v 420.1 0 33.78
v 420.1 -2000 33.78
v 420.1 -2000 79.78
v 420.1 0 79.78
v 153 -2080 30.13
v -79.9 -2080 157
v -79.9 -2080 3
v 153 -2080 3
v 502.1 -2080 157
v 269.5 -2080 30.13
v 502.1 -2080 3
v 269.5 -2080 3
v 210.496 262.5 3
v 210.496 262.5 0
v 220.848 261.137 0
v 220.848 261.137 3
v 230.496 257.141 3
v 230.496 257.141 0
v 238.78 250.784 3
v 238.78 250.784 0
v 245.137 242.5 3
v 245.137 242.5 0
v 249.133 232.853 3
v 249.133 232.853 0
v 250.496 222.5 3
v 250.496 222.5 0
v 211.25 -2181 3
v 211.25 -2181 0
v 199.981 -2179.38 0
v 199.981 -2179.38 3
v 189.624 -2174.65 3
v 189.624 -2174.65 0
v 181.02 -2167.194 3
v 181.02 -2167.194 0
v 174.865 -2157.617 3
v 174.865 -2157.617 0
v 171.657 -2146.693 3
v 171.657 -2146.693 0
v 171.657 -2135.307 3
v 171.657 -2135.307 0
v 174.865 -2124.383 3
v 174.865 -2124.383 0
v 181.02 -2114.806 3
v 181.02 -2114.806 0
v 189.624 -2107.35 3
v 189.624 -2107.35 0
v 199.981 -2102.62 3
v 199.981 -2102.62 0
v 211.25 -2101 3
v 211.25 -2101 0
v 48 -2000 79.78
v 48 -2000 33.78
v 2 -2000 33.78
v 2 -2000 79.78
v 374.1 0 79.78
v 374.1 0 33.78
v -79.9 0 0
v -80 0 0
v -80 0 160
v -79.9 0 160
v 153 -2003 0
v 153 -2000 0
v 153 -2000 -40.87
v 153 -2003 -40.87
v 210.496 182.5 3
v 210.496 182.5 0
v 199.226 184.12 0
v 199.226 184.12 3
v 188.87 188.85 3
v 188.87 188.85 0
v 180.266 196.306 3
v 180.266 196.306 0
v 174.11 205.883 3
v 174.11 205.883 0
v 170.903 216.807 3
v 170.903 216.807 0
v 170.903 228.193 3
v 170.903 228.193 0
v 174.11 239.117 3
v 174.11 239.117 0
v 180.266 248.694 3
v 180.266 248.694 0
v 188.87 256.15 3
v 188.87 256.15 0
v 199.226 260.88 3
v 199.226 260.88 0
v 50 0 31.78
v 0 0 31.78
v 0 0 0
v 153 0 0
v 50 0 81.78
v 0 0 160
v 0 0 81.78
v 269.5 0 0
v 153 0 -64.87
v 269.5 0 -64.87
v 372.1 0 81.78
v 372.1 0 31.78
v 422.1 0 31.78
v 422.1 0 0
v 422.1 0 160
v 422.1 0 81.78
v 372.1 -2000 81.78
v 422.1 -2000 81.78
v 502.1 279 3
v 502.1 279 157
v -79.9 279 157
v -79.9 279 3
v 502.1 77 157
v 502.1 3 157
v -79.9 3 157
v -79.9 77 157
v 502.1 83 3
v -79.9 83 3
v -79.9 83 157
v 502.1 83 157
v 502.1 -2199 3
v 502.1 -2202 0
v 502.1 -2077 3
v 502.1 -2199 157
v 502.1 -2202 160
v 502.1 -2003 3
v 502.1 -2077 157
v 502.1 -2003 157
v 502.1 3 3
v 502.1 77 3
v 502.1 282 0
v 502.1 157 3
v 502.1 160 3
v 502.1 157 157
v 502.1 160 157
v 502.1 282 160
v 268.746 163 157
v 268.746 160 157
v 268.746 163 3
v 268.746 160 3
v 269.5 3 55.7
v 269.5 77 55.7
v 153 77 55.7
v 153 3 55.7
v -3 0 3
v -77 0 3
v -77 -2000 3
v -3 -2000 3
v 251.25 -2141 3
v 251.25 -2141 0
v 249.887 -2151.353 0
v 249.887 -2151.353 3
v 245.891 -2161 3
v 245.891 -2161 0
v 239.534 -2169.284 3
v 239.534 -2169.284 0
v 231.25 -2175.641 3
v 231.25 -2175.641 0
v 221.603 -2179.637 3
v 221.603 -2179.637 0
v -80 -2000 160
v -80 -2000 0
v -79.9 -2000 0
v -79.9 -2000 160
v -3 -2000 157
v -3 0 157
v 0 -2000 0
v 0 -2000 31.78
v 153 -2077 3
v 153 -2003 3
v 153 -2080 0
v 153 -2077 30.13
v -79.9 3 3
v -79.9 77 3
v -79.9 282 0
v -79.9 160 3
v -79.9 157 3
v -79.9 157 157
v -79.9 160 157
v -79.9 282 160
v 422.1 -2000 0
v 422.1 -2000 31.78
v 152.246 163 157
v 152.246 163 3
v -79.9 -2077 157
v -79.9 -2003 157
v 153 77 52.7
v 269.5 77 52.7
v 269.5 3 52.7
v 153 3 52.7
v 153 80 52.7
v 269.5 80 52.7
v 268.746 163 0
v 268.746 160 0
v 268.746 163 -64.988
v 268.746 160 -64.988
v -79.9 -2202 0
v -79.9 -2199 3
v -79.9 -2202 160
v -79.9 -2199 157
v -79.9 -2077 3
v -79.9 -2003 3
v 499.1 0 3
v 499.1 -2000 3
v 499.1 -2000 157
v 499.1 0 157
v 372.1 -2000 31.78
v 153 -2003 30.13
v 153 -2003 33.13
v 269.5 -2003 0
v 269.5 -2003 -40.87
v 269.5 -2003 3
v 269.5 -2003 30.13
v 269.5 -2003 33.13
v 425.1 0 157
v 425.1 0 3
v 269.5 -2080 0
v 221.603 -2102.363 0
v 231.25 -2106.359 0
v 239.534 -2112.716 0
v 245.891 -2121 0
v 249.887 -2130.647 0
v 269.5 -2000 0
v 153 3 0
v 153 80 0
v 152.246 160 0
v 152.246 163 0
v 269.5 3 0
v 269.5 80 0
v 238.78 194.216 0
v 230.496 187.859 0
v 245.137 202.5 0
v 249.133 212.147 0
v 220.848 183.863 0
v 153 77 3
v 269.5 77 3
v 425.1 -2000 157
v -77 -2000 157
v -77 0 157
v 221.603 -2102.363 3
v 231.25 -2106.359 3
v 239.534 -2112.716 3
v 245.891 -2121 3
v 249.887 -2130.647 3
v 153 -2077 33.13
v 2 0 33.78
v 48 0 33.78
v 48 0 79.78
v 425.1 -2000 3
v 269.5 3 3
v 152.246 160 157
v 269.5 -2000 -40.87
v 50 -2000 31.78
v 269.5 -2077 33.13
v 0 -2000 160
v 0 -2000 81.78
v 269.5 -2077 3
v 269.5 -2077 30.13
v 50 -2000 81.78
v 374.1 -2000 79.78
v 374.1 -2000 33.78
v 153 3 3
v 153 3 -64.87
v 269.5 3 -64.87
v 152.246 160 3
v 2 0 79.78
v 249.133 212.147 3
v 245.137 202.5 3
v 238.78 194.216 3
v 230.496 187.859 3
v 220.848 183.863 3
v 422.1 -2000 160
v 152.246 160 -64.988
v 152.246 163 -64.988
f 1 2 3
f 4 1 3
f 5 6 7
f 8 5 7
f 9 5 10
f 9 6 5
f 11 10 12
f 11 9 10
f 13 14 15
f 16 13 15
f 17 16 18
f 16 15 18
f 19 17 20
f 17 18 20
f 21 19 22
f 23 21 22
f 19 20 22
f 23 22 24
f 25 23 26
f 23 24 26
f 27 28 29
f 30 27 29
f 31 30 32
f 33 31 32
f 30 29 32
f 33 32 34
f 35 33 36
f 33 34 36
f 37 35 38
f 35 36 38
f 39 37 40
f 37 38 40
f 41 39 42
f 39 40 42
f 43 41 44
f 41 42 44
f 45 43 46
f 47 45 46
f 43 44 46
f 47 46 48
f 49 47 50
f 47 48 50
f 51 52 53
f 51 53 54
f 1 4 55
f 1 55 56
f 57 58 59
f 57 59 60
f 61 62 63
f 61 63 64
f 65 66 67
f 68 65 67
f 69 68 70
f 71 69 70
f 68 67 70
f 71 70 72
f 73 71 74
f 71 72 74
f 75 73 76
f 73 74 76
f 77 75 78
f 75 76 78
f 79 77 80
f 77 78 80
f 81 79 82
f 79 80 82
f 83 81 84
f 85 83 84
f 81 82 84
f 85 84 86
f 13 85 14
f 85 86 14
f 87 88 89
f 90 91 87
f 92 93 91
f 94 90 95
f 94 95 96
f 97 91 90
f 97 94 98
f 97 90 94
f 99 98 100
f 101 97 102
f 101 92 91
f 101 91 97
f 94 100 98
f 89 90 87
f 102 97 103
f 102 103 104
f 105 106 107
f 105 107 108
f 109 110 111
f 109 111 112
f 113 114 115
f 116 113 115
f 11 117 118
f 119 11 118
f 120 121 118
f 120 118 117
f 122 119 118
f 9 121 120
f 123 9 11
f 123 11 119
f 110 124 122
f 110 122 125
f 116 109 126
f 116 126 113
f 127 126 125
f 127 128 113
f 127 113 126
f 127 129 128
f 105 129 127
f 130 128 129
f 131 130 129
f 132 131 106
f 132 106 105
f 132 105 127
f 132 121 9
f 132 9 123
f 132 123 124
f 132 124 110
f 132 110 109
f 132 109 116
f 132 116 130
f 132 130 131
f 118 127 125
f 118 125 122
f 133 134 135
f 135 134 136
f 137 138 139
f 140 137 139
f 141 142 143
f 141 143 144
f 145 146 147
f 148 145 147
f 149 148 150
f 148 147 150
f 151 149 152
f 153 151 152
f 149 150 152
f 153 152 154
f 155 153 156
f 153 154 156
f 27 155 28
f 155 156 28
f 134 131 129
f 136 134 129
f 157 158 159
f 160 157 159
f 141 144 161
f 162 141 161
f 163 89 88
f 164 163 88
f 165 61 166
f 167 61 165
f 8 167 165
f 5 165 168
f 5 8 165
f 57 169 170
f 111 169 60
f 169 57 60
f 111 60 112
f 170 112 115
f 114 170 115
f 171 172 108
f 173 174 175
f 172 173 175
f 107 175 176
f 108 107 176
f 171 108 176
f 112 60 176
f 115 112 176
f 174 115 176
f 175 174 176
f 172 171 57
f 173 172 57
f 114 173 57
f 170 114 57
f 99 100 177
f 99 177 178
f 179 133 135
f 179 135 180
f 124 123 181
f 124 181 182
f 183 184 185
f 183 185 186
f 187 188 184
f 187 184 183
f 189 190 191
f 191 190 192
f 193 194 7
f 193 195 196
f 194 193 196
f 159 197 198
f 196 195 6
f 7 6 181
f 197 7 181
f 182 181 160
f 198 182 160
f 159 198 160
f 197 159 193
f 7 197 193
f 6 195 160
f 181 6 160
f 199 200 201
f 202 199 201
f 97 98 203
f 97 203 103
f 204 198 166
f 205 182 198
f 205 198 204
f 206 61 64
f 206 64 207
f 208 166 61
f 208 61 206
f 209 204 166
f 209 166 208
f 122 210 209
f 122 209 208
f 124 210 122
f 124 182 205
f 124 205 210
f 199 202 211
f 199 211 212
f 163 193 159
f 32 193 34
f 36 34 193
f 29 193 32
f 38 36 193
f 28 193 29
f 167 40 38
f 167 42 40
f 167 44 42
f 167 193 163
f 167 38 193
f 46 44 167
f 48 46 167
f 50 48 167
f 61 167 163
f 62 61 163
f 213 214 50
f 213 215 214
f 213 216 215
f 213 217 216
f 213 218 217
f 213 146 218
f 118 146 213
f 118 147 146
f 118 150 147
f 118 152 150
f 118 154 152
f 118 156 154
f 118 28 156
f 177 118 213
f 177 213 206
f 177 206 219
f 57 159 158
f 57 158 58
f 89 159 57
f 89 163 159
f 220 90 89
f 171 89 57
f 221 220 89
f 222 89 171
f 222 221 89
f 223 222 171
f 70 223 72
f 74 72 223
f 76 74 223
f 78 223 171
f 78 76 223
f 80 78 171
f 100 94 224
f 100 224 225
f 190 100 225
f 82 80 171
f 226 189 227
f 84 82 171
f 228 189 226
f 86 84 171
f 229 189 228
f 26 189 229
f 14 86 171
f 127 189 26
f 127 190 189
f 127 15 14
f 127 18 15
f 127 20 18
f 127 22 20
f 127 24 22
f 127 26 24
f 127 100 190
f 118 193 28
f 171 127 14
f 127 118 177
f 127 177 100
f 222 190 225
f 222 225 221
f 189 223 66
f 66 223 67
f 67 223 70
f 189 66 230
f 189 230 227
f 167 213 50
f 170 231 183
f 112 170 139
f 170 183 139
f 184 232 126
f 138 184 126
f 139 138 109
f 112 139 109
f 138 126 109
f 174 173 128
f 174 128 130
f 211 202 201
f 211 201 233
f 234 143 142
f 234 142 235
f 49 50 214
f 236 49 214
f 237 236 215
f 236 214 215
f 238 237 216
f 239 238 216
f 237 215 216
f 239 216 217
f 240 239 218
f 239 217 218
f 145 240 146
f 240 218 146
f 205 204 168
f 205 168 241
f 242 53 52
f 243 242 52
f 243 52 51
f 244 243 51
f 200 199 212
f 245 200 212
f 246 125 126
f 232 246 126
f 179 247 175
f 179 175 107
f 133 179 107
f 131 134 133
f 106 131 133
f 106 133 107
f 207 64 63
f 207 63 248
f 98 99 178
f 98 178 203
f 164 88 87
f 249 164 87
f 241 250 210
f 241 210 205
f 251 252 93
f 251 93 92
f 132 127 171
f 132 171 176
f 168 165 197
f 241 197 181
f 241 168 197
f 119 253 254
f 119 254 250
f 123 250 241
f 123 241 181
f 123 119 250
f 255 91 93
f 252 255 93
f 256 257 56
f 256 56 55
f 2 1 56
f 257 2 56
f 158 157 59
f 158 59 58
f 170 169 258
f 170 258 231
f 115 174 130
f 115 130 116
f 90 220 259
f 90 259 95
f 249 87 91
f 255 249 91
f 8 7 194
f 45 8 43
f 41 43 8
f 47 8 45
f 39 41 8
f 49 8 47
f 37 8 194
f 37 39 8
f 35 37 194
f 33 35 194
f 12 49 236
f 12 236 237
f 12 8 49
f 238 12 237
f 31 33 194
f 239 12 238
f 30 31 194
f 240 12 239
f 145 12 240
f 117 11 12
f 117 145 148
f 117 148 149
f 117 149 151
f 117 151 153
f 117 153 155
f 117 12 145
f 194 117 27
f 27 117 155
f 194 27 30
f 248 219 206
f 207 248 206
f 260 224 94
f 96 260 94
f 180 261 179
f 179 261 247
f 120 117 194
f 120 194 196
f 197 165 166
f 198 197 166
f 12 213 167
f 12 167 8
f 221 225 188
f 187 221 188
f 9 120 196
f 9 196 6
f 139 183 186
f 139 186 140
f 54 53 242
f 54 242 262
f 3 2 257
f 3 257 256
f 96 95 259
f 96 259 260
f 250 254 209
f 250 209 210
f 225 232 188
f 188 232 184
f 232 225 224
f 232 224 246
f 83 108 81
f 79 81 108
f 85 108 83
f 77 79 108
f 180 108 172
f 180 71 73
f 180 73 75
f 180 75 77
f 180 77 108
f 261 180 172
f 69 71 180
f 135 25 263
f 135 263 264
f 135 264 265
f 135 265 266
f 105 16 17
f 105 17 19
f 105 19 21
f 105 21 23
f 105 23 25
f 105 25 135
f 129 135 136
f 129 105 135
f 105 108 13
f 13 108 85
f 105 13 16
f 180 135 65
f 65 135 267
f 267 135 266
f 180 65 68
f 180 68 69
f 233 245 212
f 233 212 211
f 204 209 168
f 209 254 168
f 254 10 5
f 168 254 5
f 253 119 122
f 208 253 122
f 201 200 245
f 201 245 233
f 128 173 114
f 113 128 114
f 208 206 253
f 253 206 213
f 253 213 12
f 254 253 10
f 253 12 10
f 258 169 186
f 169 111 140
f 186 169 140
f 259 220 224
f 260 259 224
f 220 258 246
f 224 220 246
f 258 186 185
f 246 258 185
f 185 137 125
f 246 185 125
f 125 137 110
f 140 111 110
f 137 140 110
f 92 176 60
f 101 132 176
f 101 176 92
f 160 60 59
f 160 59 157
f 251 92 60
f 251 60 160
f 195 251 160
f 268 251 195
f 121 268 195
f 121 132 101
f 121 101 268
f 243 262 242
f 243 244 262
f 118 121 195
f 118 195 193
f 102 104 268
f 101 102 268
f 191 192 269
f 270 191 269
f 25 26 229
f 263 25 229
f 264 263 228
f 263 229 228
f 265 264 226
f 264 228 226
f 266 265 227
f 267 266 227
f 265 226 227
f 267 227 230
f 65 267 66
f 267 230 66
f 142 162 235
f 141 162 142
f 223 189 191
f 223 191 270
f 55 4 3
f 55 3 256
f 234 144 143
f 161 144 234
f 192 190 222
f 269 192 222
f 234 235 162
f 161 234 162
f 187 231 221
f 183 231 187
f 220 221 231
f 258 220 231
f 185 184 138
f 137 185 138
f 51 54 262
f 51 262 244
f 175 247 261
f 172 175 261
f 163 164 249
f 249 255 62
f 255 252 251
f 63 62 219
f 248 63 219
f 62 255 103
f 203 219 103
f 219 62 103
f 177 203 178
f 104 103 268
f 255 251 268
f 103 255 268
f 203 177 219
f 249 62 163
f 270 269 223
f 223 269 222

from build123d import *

# Parameters (mm, degrees)
F0_W      = 74
F0_H      = 154
F0_W_2    = 46
F0_H_2    = 46
F1_DEPTH  = 2000
F6_W      = 74
F6_H      = 154
F7_DEPTH  = 582
F8_W      = 74
F8_H      = 154
F9_DEPTH  = 582
F10_W     = 58.25
F10_H     = 30.13
F11_DEPTH = 2160.001
F12_W     = 116.5
F12_H     = 3
F13_DEPTH = 74
F14_W     = 116.5
F14_H     = 3
F15_DEPTH = 76
F16_W     = 116.5
F16_H     = 3
F17_DEPTH = 71
F18_W     = 116.5
F18_H     = 3
F19_DEPTH = 95
F20_W     = 116.5
F20_H     = 3
F20_H_2   = 22.57
F21_DEPTH = 77
F22_DEPTH = 77
F23_DEPTH = 77
F24_W     = 74
F24_H     = 154
F25_DEPTH = 582
F27_DEPTH = 3
F29_DEPTH = 582
F31_DEPTH = 25
F32_DEPTH = 582
F34_DEPTH = 25


# Not quite as in the source:
# - a feature names something its author has since deleted; it is built from what else it names


with BuildPart() as f1:
    # F0 (on Front) → F1 (new body)
    with BuildSketch(Plane.XZ):
        Polygon((-80, 0), (0, 0), (0, 16.85), (0, 31.78), (0, 81.78), (0, 160), (-77, 160), (-80, 160), align=None)
        with Locations((-40, 80)):
            Rectangle(F0_W, F0_H, mode=Mode.SUBTRACT)
        Polygon((0, 81.78), (0, 31.78), (50, 31.78), (50, 81.78), (2, 81.78), align=None)
        with Locations((25, 56.78)):
            Rectangle(F0_W_2, F0_H_2, mode=Mode.SUBTRACT)
    extrude(amount=F1_DEPTH)


with BuildPart() as f2_1:
    # F2: instance of F1
    add(f1.part.mirror(Plane(origin=(50, -1000, 56.78), x_dir=(0, 1, 0), z_dir=(1, 0, 0))))


with BuildPart() as f2_1_1:
    # F3: moved
    add(f2_1.part.moved(Location((63, 0, 0))))


with BuildPart() as f2_1_2:
    # F5: moved
    add(f2_1_1.part.moved(Location((259.1, 0, 0))))


with BuildPart() as f1_1:
    add(f1.part)

    add(f2_1_2.part)  # F7 merges F2_1
    # F6 (on face) → F7 (join)
    with BuildSketch(Plane.YZ.offset(502.1)):
        Polygon((-2000, 0), (-2000, 160), (-2077, 160), (-2080, 160), (-2080, 0), align=None)
        with Locations((-2040, 80)):
            Rectangle(F6_W, F6_H, mode=Mode.SUBTRACT)
    extrude(amount=-F7_DEPTH)

    # F8 (on face) → F9 (join)
    with BuildSketch(Plane.YZ.offset(502.1)):
        Polygon((80, 160), (0, 160), (0, 0), (3, 0), (80, 0), align=None)
        with Locations((40, 80)):
            Rectangle(F8_W, F8_H, mode=Mode.SUBTRACT)
    extrude(amount=-F9_DEPTH)

    # F10 (on face) → F11 (cut, through all)
    with BuildSketch(Plane.XZ.offset(2080)):
        with Locations((182.125, 15.065)):
            Rectangle(F10_W, F10_H)
        with Locations((240.375, 15.065)):
            Rectangle(F10_W, F10_H)
    extrude(amount=-F11_DEPTH, mode=Mode.SUBTRACT)

    # F12 (on face) + F10 (on face) → F13 (join)
    with BuildSketch(Plane(origin=(0, -2077, 0), x_dir=(-1, 0, 0), z_dir=(0, 1, 0))):
        with Locations((-211.25, 31.63)):
            Rectangle(F12_W, F12_H)
    with BuildSketch(Plane.XZ.offset(2080)):
        with Locations((182.125, 15.065)):
            Rectangle(F10_W, F10_H)
    extrude(amount=F13_DEPTH, dir=(0, 1, 0))

    # F14 (on face) → F15 (join)
    with BuildSketch(Plane.XZ.offset(-77)):
        with Locations((211.25, 31.63)):
            Rectangle(F14_W, F14_H)
    extrude(amount=F15_DEPTH)

    # F16 (on face) → F17 (join)
    with BuildSketch(Plane(origin=(0, 0, 30.13), x_dir=(1, 0, 0), z_dir=(0, 0, -1))):
        with Locations((211.25, 2001.5)):
            Rectangle(F16_W, F16_H)
    extrude(amount=F17_DEPTH)

    # F18 (on face) → F19 (join)
    with BuildSketch(Plane(origin=(0, 0, 30.13), x_dir=(1, 0, 0), z_dir=(0, 0, -1))):
        with Locations((211.25, -1.5)):
            Rectangle(F18_W, F18_H)
    extrude(amount=F19_DEPTH)

    # F20 (on face) → F21 (cut)
    with BuildSketch(Plane(origin=(0, 80, 0), x_dir=(-1, 0, 0), z_dir=(0, 1, 0))):
        with Locations((-211.25, 54.2)):
            Rectangle(F20_W, F20_H)
        with Locations((-211.25, 41.415)):
            Rectangle(F20_W, F20_H_2)
    extrude(amount=-F21_DEPTH, mode=Mode.SUBTRACT)

    # F20 (on face) → F22 (join)
    with BuildSketch(Plane(origin=(0, 80, 0), x_dir=(-1, 0, 0), z_dir=(0, 1, 0))):
        with Locations((-211.25, 54.2)):
            Rectangle(F20_W, F20_H)
    extrude(amount=-F22_DEPTH)

    # F10 (on face) → F23 (cut)
    with BuildSketch(Plane.XZ.offset(2080)):
        with Locations((182.125, 15.065)):
            Rectangle(F10_W, F10_H)
    extrude(amount=-F23_DEPTH, mode=Mode.SUBTRACT)

    # F24 (on face) → F25 (join)
    with BuildSketch(Plane(origin=(-79.9, 0, 0), x_dir=(0, -1, 0), z_dir=(-1, 0, 0))):
        Polygon((-80, 3), (-80, 160), (-160, 160), (-160, 0), (-80, 0), align=None)
        with Locations((-120, 80)):
            Rectangle(F24_W, F24_H, mode=Mode.SUBTRACT)
    extrude(amount=-F25_DEPTH)

    # F26 (on face) → F27 (join)
    with BuildSketch(Plane(origin=(0, 160, 0), x_dir=(-1, 0, 0), z_dir=(0, 1, 0))):
        Polygon((-268.7456309795, 160), (-268.7456309795, 0), (-268.7456309795, -64.9877786636), (-152.2456309795, -64.9877786636), (-152.2456309795, 160), align=None)
    extrude(amount=F27_DEPTH)

    # F28 (on face) → F29 (join)
    with BuildSketch(Plane.YZ.offset(502.1)):
        Polygon((282, 160), (160, 160), (160, 157), (279, 157), (279, 3), (160, 3), (160, 0), (282, 0), align=None)
    extrude(amount=-F29_DEPTH)

    # F30 (on face) → F31 (cut)
    with BuildSketch(Plane(origin=(0, 0, 0), x_dir=(1, 0, 0), z_dir=(0, 0, -1))):
        with BuildLine():
            ThreePointArc((250.4956309795, -222.5), (238.779902227, -194.2157287525), (210.4956309795, -182.5))
            Line((210.4956309795, -182.5), (210.4956309795, -222.5))
            Line((210.4956309795, -222.5), (210.4956309795, -262.5))
            ThreePointArc((210.4956309795, -262.5), (238.779902227, -250.7842712475), (250.4956309795, -222.5))
        make_face()
        with BuildLine():
            Line((210.4956309795, -222.5), (210.4956309795, -182.5))
            ThreePointArc((210.4956309795, -182.5), (170.4956309795, -222.5), (210.4956309795, -262.5))
            Line((210.4956309795, -262.5), (210.4956309795, -222.5))
        make_face()
    extrude(amount=-F31_DEPTH, mode=Mode.SUBTRACT)

    # F28 (on face) → F32 (join)
    with BuildSketch(Plane.YZ.offset(502.1)):
        Polygon((-2080, 157), (-2080, 160), (-2202, 160), (-2202, 0), (-2080, 0), (-2080, 3), (-2199, 3), (-2199, 157), align=None)
    extrude(amount=-F32_DEPTH)

    # F33 (on face) → F34 (cut)
    with BuildSketch(Plane(origin=(0, 0, 0), x_dir=(1, 0, 0), z_dir=(0, 0, -1))):
        with BuildLine():
            ThreePointArc((211.25, 2181), (171.25, 2141), (211.25, 2101))
            Line((211.25, 2101), (211.25, 2181))
        make_face()
        with BuildLine():
            Line((211.25, 2181), (211.25, 2101))
            ThreePointArc((211.25, 2101), (239.5342712475, 2112.7157287525), (251.25, 2141))
            ThreePointArc((251.25, 2141), (239.5342712475, 2169.2842712475), (211.25, 2181))
        make_face()
    extrude(amount=-F34_DEPTH, mode=Mode.SUBTRACT)


solid = f1_1.part
